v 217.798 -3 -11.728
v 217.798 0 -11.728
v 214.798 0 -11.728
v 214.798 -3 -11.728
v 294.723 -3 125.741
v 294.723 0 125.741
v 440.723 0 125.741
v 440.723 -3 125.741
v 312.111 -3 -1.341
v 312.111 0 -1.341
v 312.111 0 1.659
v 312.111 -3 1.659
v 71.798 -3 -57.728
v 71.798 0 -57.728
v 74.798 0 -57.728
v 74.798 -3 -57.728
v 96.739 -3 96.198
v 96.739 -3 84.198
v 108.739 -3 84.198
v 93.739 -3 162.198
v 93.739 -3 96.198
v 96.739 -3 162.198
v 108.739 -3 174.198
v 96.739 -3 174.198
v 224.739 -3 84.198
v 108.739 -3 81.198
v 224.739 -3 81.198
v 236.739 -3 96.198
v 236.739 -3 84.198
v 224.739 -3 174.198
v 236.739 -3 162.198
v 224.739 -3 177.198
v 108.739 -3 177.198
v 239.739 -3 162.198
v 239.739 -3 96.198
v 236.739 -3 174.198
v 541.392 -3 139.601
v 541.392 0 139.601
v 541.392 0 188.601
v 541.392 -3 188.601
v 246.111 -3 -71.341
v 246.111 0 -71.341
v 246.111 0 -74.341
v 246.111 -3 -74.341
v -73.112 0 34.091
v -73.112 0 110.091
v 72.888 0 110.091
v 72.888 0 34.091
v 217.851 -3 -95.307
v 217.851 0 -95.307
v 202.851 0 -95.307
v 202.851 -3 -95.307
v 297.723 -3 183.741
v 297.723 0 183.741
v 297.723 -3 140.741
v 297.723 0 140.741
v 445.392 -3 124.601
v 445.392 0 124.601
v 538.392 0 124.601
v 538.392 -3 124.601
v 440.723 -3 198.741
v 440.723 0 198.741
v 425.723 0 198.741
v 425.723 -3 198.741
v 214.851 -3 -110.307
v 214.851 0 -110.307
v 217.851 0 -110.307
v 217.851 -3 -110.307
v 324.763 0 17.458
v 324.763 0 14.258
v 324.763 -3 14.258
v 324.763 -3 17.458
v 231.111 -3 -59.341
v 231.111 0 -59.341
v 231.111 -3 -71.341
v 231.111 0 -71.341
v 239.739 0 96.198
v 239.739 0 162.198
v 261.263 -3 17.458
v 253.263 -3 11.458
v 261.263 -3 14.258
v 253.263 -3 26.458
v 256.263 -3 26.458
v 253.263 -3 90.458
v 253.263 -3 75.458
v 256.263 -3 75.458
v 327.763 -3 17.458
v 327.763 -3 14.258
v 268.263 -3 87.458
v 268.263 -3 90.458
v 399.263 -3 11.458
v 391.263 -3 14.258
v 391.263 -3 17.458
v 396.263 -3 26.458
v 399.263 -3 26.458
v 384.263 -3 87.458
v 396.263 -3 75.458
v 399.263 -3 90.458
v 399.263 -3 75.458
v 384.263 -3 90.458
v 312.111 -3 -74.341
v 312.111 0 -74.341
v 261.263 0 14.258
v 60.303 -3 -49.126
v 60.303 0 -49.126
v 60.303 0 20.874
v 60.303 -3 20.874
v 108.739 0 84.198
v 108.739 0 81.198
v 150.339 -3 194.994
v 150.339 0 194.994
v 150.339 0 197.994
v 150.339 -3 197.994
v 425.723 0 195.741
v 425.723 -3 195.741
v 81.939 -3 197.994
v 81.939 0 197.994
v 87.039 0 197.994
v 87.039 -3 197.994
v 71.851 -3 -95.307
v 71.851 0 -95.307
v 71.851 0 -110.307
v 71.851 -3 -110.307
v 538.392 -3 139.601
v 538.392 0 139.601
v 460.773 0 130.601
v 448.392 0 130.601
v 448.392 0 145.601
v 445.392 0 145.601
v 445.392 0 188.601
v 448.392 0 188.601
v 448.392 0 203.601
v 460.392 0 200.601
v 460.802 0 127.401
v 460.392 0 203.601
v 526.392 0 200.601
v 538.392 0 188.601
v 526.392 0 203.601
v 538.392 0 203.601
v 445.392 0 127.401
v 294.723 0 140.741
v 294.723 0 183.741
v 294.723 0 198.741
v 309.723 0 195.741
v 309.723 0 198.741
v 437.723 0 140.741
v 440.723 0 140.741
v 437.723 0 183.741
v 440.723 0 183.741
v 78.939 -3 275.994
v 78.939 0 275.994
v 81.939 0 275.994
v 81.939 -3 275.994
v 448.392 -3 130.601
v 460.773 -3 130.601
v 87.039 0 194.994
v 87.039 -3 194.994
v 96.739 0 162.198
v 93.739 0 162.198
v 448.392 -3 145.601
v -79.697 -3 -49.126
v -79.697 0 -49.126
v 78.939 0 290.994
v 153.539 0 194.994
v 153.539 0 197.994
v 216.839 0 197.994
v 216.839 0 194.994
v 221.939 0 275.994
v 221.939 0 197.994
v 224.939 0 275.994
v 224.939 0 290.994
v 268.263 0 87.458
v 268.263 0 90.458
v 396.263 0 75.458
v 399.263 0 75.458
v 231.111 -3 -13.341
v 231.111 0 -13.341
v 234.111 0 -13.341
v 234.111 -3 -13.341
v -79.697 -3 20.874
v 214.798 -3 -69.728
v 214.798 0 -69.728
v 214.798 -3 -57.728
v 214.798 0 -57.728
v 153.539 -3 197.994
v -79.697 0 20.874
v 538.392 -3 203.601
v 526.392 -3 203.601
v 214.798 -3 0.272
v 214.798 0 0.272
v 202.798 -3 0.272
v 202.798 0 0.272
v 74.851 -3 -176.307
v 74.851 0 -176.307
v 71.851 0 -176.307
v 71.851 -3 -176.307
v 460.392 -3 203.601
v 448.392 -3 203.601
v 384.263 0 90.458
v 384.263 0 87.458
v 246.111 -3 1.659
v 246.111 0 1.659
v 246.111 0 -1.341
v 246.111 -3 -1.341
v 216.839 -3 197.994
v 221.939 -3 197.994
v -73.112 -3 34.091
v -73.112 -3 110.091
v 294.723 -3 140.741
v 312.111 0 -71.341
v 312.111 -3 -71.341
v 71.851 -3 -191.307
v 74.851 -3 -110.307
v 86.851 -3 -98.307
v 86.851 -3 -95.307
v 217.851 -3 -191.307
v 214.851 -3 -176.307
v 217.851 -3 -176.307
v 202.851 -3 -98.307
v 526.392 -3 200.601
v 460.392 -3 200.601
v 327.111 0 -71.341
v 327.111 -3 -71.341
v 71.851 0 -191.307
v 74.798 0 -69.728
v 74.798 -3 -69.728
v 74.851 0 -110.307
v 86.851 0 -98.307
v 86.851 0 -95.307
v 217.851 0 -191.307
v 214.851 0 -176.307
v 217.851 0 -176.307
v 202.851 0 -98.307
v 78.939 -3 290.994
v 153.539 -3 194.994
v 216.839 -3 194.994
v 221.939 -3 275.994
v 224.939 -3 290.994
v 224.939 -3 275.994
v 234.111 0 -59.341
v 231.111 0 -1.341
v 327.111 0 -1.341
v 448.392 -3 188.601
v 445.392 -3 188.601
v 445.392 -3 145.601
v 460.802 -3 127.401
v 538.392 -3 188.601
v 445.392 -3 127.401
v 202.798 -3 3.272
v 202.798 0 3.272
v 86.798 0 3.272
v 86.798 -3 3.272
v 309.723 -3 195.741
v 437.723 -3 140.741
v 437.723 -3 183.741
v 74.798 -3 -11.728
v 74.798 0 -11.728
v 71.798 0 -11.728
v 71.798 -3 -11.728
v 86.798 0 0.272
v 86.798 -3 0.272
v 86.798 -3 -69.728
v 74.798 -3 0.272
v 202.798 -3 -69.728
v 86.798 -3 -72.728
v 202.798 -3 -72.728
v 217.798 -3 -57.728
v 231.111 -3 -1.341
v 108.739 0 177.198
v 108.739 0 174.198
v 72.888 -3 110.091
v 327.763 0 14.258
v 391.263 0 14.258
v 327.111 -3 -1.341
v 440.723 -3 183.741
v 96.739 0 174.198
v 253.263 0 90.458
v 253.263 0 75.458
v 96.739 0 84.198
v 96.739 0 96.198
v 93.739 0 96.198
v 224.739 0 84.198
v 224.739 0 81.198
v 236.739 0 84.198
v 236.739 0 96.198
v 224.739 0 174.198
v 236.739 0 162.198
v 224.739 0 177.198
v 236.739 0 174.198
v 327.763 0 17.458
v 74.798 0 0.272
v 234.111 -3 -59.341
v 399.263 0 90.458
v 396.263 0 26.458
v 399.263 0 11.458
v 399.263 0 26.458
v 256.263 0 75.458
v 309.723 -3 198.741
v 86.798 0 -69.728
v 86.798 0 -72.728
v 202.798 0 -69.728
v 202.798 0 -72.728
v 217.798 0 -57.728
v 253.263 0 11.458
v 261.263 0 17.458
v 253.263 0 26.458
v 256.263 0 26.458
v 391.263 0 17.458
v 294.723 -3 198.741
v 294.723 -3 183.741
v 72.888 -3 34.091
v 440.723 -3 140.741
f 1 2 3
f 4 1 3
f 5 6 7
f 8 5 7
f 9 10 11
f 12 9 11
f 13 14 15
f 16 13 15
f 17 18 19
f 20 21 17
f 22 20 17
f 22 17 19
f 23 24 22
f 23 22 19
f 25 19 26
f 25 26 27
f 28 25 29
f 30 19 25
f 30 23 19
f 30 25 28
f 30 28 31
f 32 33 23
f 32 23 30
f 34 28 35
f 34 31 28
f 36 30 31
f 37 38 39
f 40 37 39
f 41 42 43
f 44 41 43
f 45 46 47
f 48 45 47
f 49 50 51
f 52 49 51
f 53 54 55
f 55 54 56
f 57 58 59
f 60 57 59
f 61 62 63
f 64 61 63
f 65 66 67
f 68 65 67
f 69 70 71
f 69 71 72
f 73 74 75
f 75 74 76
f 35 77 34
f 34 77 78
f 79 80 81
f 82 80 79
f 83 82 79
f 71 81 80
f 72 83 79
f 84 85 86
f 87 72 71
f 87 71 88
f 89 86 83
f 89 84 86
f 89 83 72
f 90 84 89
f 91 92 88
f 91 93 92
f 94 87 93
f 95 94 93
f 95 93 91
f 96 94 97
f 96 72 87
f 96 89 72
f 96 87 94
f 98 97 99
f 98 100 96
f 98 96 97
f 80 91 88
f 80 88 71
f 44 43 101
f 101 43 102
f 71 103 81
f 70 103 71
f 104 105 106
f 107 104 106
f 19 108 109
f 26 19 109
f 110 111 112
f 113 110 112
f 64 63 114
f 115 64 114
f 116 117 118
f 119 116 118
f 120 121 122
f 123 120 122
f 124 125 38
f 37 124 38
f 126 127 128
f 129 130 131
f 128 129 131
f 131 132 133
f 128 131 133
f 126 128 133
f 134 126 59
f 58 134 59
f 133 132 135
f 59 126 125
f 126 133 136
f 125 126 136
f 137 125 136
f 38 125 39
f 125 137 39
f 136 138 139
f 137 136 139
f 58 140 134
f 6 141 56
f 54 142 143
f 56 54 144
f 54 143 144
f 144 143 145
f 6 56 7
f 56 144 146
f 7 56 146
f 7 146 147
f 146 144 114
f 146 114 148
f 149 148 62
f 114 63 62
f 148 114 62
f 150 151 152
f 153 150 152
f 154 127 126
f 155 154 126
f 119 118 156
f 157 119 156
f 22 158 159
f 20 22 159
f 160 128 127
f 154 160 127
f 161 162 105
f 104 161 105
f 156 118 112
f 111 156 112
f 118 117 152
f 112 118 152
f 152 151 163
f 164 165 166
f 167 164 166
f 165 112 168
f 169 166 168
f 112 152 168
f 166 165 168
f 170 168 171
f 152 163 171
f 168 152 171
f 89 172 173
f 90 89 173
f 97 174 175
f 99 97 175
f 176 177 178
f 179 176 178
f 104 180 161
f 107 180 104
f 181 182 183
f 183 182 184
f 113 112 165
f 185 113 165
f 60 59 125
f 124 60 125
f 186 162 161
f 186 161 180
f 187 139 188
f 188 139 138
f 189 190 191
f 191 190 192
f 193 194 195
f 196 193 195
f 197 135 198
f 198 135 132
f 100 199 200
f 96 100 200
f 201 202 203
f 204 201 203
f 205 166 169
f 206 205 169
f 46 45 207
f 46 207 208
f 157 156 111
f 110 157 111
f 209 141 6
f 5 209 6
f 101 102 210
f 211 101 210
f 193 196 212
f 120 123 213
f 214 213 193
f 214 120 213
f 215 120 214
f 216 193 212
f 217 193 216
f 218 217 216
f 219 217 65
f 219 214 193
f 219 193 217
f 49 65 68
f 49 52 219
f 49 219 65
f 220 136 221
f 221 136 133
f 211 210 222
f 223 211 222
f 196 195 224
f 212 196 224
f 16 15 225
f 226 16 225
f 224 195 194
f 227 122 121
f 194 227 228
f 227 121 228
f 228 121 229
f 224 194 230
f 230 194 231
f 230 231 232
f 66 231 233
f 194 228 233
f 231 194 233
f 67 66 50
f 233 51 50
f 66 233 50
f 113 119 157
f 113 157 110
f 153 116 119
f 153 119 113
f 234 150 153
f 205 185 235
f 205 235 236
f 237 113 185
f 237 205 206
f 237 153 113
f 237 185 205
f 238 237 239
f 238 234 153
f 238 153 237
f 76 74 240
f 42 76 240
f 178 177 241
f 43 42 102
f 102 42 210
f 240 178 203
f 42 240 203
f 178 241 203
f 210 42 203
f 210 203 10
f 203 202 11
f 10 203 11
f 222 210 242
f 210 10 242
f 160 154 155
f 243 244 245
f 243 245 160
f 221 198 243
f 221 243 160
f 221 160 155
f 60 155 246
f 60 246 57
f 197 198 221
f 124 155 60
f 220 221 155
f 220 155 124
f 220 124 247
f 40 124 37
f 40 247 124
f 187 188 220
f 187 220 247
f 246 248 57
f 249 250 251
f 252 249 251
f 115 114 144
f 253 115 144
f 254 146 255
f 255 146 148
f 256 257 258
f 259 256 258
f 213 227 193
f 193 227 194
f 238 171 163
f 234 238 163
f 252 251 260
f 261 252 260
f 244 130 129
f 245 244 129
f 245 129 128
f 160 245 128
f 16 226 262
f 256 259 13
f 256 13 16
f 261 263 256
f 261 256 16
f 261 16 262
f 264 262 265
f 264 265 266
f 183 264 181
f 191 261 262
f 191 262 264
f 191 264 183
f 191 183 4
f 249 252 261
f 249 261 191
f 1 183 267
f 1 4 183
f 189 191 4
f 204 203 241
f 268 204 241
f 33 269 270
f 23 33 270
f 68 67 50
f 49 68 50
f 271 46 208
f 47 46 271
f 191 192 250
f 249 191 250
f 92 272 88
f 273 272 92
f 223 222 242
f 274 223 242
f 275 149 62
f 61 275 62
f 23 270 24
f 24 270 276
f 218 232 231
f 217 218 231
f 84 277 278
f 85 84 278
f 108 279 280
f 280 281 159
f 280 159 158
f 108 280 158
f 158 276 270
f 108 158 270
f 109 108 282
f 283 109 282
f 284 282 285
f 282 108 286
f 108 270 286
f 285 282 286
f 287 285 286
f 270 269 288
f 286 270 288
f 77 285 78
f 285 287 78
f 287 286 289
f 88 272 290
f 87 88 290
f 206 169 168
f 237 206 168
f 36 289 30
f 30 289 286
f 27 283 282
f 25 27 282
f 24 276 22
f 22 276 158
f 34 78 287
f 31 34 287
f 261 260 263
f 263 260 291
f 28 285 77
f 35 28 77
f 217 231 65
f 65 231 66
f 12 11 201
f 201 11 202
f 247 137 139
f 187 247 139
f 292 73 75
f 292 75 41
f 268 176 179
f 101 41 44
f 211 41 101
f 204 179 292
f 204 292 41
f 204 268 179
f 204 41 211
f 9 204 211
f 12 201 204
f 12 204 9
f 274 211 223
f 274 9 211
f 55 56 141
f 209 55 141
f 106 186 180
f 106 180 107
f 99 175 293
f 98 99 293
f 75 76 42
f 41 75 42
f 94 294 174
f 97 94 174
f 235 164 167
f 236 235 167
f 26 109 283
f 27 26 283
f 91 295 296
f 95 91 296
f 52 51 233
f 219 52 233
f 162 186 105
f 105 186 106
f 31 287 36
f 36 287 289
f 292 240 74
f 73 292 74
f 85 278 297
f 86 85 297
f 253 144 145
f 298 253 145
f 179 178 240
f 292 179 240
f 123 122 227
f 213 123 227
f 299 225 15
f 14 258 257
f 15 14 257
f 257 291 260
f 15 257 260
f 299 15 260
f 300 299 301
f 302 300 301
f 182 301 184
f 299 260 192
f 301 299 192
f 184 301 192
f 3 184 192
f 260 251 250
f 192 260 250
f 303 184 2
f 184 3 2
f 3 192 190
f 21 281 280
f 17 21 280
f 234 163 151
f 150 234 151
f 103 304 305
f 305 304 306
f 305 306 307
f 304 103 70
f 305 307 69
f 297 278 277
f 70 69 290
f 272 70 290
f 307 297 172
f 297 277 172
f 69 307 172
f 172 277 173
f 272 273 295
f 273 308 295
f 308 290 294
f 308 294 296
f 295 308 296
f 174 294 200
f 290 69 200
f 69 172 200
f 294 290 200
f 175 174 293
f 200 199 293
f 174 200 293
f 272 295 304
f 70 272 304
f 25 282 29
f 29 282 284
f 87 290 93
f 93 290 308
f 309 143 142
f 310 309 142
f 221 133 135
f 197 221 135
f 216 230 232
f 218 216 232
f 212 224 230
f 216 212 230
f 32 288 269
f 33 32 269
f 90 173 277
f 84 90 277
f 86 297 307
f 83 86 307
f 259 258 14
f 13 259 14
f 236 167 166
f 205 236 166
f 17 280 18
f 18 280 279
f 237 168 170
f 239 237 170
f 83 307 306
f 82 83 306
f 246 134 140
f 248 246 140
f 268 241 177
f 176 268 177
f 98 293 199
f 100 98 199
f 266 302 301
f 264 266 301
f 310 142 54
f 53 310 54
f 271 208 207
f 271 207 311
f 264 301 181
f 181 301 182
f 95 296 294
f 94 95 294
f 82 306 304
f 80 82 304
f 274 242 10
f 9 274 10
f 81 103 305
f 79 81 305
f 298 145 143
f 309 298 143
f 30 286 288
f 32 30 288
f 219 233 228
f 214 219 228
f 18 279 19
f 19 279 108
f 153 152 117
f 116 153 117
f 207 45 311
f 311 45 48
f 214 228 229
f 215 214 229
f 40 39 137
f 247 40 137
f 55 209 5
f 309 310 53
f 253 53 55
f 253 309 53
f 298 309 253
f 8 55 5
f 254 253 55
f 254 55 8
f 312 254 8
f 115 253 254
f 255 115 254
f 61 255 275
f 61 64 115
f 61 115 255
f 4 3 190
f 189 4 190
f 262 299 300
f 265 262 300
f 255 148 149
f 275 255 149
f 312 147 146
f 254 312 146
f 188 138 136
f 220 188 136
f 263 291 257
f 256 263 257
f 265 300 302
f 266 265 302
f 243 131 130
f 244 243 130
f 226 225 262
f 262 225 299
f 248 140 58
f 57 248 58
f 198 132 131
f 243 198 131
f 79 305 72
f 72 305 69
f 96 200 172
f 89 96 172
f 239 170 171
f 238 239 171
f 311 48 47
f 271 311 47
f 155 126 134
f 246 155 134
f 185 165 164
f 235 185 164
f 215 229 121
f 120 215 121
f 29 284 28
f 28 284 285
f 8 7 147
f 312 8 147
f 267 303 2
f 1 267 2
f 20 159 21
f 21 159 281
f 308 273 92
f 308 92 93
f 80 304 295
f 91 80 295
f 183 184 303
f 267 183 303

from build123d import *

# Parameters (mm, degrees)
F0_W      = 140
F0_H      = 70
F1_DEPTH  = 3
F2_W      = 146
F2_H      = 76
F3_DEPTH  = 3
F5_DEPTH  = 3
F7_DEPTH  = 3
F9_DEPTH  = 3
F11_DEPTH = 3
F12_W     = 63.5
F12_H     = 3.2
F13_DEPTH = 3
F15_DEPTH = 3
F17_DEPTH = 3
F19_DEPTH = 3


with BuildPart() as f1:
    # F0 (on Front) → F1 (new body)
    with BuildSketch(Plane.XZ):
        with Locations((-9.696564, -14.125969)):
            Rectangle(F0_W, F0_H)
    extrude(amount=F1_DEPTH)


with BuildPart() as f3:
    # F2 (on Front) → F3 (new body)
    with BuildSketch(Plane.XZ):
        with Locations((-0.111669, 72.091474)):
            Rectangle(F2_W, F2_H)
    extrude(amount=F3_DEPTH)


with BuildPart() as f5:
    # F4 (on Front) → F5 (new body)
    with BuildSketch(Plane.XZ):
        Polygon((202.797739, 3.272015), (86.797739, 3.272015), (86.797739, 0.272015), (74.797739, 0.272015), (74.797739, -11.727985), (71.797739, -11.727985), (71.797739, -57.727985), (74.797739, -57.727985), (74.797739, -69.727985), (86.797739, -69.727985), (86.797739, -72.727985), (202.797739, -72.727985), (202.797739, -69.727985), (214.797739, -69.727985), (214.797739, -57.727985), (217.797739, -57.727985), (217.797739, -11.727985), (214.797739, -11.727985), (214.797739, 0.272015), (202.797739, 0.272015), align=None)
    extrude(amount=F5_DEPTH)


with BuildPart() as f7:
    # F6 (on Front) → F7 (new body)
    with BuildSketch(Plane.XZ):
        Polygon((246.111184, -1.341278), (231.111184, -1.341278), (231.111184, -13.341278), (234.111184, -13.341278), (234.111184, -59.341278), (231.111184, -59.341278), (231.111184, -71.341278), (246.111184, -71.341278), (246.111184, -74.341278), (312.111184, -74.341278), (312.111184, -71.341278), (327.111184, -71.341278), (327.111184, -1.341278), (312.111184, -1.341278), (312.111184, 1.658722), (246.111184, 1.658722), align=None)
    extrude(amount=F7_DEPTH)


with BuildPart() as f9:
    # F8 (on Front) → F9 (new body)
    with BuildSketch(Plane.XZ):
        Polygon((86.851429, -95.306903), (71.851429, -95.306903), (71.851429, -110.306903), (74.851429, -110.306903), (74.851429, -176.306903), (71.851429, -176.306903), (71.851429, -191.306903), (217.851429, -191.306903), (217.851429, -176.306903), (214.851429, -176.306903), (214.851429, -110.306903), (217.851429, -110.306903), (217.851429, -95.306903), (202.851429, -95.306903), (202.851429, -98.306903), (86.851429, -98.306903), align=None)
    extrude(amount=F9_DEPTH)


with BuildPart() as f11:
    # F10 (on Front) → F11 (new body)
    with BuildSketch(Plane.XZ):
        Polygon((224.738808, 177.197629), (108.738808, 177.197629), (108.738808, 174.197629), (96.738808, 174.197629), (96.738808, 162.197629), (93.738808, 162.197629), (93.738808, 96.197629), (96.738808, 96.197629), (96.738808, 84.197629), (108.738808, 84.197629), (108.738808, 81.197629), (224.738808, 81.197629), (224.738808, 84.197629), (236.738808, 84.197629), (236.738808, 96.197629), (239.738808, 96.197629), (239.738808, 162.197629), (236.738808, 162.197629), (236.738808, 174.197629), (224.738808, 174.197629), align=None)
    extrude(amount=F11_DEPTH)


with BuildPart() as f13:
    # F12 (on Front) → F13 (new body)
    with BuildSketch(Plane.XZ):
        Polygon((268.262891, 90.458037), (253.262891, 90.458037), (253.262891, 75.458037), (256.262891, 75.458037), (256.262891, 26.458037), (253.262891, 26.458037), (253.262891, 11.458037), (399.262891, 11.458037), (399.262891, 26.458037), (396.262891, 26.458037), (396.262891, 75.458037), (399.262891, 75.458037), (399.262891, 90.458037), (384.262891, 90.458037), (384.262891, 87.458037), (268.262891, 87.458037), align=None)
        with Locations((293.012891, 15.858037)):
            Rectangle(F12_W, F12_H, mode=Mode.SUBTRACT)
        with Locations((359.512891, 15.858037)):
            Rectangle(F12_W, F12_H, mode=Mode.SUBTRACT)
    extrude(amount=F13_DEPTH)


with BuildPart() as f15:
    # F14 (on Front) → F15 (new body)
    with BuildSketch(Plane.XZ):
        Polygon((294.723024, 140.7406), (294.723024, 125.7406), (440.723024, 125.7406), (440.723024, 140.7406), (437.723024, 140.7406), (437.723024, 183.7406), (440.723024, 183.7406), (440.723024, 198.7406), (425.723024, 198.7406), (425.723024, 195.7406), (309.723024, 195.7406), (309.723024, 198.7406), (294.723024, 198.7406), (294.723024, 183.7406), (297.723024, 183.7406), (297.723024, 140.7406), align=None)
    extrude(amount=F15_DEPTH)


with BuildPart() as f17:
    # F16 (on Front) → F17 (new body)
    with BuildSketch(Plane.XZ):
        Polygon((460.391923, 203.601332), (448.391923, 203.601332), (448.391923, 188.601332), (445.391923, 188.601332), (445.391923, 145.601332), (448.391923, 145.601332), (448.391923, 130.601332), (460.7732, 130.601332), (460.802227, 127.401332), (445.391923, 127.401332), (445.391923, 124.601332), (538.391923, 124.601332), (538.391923, 139.601332), (541.391923, 139.601332), (541.391923, 188.601332), (538.391923, 188.601332), (538.391923, 203.601332), (526.391923, 203.601332), (526.391923, 200.601332), (460.391923, 200.601332), align=None)
    extrude(amount=F17_DEPTH)


with BuildPart() as f19:
    # F18 (on Front) → F19 (new body)
    with BuildSketch(Plane.XZ):
        Polygon((224.939221, 290.994182), (78.939221, 290.994182), (78.939221, 275.994182), (81.939221, 275.994182), (81.939221, 197.994182), (87.039221, 197.994182), (87.039221, 194.994182), (150.339221, 194.994182), (150.339221, 197.994182), (153.539221, 197.994182), (153.539221, 194.994182), (216.839221, 194.994182), (216.839221, 197.994182), (221.939221, 197.994182), (221.939221, 275.994182), (224.939221, 275.994182), align=None)
    extrude(amount=F19_DEPTH)


solid = Compound([f1.part, f3.part, f5.part, f7.part, f9.part, f11.part, f13.part, f15.part, f17.part, f19.part])
